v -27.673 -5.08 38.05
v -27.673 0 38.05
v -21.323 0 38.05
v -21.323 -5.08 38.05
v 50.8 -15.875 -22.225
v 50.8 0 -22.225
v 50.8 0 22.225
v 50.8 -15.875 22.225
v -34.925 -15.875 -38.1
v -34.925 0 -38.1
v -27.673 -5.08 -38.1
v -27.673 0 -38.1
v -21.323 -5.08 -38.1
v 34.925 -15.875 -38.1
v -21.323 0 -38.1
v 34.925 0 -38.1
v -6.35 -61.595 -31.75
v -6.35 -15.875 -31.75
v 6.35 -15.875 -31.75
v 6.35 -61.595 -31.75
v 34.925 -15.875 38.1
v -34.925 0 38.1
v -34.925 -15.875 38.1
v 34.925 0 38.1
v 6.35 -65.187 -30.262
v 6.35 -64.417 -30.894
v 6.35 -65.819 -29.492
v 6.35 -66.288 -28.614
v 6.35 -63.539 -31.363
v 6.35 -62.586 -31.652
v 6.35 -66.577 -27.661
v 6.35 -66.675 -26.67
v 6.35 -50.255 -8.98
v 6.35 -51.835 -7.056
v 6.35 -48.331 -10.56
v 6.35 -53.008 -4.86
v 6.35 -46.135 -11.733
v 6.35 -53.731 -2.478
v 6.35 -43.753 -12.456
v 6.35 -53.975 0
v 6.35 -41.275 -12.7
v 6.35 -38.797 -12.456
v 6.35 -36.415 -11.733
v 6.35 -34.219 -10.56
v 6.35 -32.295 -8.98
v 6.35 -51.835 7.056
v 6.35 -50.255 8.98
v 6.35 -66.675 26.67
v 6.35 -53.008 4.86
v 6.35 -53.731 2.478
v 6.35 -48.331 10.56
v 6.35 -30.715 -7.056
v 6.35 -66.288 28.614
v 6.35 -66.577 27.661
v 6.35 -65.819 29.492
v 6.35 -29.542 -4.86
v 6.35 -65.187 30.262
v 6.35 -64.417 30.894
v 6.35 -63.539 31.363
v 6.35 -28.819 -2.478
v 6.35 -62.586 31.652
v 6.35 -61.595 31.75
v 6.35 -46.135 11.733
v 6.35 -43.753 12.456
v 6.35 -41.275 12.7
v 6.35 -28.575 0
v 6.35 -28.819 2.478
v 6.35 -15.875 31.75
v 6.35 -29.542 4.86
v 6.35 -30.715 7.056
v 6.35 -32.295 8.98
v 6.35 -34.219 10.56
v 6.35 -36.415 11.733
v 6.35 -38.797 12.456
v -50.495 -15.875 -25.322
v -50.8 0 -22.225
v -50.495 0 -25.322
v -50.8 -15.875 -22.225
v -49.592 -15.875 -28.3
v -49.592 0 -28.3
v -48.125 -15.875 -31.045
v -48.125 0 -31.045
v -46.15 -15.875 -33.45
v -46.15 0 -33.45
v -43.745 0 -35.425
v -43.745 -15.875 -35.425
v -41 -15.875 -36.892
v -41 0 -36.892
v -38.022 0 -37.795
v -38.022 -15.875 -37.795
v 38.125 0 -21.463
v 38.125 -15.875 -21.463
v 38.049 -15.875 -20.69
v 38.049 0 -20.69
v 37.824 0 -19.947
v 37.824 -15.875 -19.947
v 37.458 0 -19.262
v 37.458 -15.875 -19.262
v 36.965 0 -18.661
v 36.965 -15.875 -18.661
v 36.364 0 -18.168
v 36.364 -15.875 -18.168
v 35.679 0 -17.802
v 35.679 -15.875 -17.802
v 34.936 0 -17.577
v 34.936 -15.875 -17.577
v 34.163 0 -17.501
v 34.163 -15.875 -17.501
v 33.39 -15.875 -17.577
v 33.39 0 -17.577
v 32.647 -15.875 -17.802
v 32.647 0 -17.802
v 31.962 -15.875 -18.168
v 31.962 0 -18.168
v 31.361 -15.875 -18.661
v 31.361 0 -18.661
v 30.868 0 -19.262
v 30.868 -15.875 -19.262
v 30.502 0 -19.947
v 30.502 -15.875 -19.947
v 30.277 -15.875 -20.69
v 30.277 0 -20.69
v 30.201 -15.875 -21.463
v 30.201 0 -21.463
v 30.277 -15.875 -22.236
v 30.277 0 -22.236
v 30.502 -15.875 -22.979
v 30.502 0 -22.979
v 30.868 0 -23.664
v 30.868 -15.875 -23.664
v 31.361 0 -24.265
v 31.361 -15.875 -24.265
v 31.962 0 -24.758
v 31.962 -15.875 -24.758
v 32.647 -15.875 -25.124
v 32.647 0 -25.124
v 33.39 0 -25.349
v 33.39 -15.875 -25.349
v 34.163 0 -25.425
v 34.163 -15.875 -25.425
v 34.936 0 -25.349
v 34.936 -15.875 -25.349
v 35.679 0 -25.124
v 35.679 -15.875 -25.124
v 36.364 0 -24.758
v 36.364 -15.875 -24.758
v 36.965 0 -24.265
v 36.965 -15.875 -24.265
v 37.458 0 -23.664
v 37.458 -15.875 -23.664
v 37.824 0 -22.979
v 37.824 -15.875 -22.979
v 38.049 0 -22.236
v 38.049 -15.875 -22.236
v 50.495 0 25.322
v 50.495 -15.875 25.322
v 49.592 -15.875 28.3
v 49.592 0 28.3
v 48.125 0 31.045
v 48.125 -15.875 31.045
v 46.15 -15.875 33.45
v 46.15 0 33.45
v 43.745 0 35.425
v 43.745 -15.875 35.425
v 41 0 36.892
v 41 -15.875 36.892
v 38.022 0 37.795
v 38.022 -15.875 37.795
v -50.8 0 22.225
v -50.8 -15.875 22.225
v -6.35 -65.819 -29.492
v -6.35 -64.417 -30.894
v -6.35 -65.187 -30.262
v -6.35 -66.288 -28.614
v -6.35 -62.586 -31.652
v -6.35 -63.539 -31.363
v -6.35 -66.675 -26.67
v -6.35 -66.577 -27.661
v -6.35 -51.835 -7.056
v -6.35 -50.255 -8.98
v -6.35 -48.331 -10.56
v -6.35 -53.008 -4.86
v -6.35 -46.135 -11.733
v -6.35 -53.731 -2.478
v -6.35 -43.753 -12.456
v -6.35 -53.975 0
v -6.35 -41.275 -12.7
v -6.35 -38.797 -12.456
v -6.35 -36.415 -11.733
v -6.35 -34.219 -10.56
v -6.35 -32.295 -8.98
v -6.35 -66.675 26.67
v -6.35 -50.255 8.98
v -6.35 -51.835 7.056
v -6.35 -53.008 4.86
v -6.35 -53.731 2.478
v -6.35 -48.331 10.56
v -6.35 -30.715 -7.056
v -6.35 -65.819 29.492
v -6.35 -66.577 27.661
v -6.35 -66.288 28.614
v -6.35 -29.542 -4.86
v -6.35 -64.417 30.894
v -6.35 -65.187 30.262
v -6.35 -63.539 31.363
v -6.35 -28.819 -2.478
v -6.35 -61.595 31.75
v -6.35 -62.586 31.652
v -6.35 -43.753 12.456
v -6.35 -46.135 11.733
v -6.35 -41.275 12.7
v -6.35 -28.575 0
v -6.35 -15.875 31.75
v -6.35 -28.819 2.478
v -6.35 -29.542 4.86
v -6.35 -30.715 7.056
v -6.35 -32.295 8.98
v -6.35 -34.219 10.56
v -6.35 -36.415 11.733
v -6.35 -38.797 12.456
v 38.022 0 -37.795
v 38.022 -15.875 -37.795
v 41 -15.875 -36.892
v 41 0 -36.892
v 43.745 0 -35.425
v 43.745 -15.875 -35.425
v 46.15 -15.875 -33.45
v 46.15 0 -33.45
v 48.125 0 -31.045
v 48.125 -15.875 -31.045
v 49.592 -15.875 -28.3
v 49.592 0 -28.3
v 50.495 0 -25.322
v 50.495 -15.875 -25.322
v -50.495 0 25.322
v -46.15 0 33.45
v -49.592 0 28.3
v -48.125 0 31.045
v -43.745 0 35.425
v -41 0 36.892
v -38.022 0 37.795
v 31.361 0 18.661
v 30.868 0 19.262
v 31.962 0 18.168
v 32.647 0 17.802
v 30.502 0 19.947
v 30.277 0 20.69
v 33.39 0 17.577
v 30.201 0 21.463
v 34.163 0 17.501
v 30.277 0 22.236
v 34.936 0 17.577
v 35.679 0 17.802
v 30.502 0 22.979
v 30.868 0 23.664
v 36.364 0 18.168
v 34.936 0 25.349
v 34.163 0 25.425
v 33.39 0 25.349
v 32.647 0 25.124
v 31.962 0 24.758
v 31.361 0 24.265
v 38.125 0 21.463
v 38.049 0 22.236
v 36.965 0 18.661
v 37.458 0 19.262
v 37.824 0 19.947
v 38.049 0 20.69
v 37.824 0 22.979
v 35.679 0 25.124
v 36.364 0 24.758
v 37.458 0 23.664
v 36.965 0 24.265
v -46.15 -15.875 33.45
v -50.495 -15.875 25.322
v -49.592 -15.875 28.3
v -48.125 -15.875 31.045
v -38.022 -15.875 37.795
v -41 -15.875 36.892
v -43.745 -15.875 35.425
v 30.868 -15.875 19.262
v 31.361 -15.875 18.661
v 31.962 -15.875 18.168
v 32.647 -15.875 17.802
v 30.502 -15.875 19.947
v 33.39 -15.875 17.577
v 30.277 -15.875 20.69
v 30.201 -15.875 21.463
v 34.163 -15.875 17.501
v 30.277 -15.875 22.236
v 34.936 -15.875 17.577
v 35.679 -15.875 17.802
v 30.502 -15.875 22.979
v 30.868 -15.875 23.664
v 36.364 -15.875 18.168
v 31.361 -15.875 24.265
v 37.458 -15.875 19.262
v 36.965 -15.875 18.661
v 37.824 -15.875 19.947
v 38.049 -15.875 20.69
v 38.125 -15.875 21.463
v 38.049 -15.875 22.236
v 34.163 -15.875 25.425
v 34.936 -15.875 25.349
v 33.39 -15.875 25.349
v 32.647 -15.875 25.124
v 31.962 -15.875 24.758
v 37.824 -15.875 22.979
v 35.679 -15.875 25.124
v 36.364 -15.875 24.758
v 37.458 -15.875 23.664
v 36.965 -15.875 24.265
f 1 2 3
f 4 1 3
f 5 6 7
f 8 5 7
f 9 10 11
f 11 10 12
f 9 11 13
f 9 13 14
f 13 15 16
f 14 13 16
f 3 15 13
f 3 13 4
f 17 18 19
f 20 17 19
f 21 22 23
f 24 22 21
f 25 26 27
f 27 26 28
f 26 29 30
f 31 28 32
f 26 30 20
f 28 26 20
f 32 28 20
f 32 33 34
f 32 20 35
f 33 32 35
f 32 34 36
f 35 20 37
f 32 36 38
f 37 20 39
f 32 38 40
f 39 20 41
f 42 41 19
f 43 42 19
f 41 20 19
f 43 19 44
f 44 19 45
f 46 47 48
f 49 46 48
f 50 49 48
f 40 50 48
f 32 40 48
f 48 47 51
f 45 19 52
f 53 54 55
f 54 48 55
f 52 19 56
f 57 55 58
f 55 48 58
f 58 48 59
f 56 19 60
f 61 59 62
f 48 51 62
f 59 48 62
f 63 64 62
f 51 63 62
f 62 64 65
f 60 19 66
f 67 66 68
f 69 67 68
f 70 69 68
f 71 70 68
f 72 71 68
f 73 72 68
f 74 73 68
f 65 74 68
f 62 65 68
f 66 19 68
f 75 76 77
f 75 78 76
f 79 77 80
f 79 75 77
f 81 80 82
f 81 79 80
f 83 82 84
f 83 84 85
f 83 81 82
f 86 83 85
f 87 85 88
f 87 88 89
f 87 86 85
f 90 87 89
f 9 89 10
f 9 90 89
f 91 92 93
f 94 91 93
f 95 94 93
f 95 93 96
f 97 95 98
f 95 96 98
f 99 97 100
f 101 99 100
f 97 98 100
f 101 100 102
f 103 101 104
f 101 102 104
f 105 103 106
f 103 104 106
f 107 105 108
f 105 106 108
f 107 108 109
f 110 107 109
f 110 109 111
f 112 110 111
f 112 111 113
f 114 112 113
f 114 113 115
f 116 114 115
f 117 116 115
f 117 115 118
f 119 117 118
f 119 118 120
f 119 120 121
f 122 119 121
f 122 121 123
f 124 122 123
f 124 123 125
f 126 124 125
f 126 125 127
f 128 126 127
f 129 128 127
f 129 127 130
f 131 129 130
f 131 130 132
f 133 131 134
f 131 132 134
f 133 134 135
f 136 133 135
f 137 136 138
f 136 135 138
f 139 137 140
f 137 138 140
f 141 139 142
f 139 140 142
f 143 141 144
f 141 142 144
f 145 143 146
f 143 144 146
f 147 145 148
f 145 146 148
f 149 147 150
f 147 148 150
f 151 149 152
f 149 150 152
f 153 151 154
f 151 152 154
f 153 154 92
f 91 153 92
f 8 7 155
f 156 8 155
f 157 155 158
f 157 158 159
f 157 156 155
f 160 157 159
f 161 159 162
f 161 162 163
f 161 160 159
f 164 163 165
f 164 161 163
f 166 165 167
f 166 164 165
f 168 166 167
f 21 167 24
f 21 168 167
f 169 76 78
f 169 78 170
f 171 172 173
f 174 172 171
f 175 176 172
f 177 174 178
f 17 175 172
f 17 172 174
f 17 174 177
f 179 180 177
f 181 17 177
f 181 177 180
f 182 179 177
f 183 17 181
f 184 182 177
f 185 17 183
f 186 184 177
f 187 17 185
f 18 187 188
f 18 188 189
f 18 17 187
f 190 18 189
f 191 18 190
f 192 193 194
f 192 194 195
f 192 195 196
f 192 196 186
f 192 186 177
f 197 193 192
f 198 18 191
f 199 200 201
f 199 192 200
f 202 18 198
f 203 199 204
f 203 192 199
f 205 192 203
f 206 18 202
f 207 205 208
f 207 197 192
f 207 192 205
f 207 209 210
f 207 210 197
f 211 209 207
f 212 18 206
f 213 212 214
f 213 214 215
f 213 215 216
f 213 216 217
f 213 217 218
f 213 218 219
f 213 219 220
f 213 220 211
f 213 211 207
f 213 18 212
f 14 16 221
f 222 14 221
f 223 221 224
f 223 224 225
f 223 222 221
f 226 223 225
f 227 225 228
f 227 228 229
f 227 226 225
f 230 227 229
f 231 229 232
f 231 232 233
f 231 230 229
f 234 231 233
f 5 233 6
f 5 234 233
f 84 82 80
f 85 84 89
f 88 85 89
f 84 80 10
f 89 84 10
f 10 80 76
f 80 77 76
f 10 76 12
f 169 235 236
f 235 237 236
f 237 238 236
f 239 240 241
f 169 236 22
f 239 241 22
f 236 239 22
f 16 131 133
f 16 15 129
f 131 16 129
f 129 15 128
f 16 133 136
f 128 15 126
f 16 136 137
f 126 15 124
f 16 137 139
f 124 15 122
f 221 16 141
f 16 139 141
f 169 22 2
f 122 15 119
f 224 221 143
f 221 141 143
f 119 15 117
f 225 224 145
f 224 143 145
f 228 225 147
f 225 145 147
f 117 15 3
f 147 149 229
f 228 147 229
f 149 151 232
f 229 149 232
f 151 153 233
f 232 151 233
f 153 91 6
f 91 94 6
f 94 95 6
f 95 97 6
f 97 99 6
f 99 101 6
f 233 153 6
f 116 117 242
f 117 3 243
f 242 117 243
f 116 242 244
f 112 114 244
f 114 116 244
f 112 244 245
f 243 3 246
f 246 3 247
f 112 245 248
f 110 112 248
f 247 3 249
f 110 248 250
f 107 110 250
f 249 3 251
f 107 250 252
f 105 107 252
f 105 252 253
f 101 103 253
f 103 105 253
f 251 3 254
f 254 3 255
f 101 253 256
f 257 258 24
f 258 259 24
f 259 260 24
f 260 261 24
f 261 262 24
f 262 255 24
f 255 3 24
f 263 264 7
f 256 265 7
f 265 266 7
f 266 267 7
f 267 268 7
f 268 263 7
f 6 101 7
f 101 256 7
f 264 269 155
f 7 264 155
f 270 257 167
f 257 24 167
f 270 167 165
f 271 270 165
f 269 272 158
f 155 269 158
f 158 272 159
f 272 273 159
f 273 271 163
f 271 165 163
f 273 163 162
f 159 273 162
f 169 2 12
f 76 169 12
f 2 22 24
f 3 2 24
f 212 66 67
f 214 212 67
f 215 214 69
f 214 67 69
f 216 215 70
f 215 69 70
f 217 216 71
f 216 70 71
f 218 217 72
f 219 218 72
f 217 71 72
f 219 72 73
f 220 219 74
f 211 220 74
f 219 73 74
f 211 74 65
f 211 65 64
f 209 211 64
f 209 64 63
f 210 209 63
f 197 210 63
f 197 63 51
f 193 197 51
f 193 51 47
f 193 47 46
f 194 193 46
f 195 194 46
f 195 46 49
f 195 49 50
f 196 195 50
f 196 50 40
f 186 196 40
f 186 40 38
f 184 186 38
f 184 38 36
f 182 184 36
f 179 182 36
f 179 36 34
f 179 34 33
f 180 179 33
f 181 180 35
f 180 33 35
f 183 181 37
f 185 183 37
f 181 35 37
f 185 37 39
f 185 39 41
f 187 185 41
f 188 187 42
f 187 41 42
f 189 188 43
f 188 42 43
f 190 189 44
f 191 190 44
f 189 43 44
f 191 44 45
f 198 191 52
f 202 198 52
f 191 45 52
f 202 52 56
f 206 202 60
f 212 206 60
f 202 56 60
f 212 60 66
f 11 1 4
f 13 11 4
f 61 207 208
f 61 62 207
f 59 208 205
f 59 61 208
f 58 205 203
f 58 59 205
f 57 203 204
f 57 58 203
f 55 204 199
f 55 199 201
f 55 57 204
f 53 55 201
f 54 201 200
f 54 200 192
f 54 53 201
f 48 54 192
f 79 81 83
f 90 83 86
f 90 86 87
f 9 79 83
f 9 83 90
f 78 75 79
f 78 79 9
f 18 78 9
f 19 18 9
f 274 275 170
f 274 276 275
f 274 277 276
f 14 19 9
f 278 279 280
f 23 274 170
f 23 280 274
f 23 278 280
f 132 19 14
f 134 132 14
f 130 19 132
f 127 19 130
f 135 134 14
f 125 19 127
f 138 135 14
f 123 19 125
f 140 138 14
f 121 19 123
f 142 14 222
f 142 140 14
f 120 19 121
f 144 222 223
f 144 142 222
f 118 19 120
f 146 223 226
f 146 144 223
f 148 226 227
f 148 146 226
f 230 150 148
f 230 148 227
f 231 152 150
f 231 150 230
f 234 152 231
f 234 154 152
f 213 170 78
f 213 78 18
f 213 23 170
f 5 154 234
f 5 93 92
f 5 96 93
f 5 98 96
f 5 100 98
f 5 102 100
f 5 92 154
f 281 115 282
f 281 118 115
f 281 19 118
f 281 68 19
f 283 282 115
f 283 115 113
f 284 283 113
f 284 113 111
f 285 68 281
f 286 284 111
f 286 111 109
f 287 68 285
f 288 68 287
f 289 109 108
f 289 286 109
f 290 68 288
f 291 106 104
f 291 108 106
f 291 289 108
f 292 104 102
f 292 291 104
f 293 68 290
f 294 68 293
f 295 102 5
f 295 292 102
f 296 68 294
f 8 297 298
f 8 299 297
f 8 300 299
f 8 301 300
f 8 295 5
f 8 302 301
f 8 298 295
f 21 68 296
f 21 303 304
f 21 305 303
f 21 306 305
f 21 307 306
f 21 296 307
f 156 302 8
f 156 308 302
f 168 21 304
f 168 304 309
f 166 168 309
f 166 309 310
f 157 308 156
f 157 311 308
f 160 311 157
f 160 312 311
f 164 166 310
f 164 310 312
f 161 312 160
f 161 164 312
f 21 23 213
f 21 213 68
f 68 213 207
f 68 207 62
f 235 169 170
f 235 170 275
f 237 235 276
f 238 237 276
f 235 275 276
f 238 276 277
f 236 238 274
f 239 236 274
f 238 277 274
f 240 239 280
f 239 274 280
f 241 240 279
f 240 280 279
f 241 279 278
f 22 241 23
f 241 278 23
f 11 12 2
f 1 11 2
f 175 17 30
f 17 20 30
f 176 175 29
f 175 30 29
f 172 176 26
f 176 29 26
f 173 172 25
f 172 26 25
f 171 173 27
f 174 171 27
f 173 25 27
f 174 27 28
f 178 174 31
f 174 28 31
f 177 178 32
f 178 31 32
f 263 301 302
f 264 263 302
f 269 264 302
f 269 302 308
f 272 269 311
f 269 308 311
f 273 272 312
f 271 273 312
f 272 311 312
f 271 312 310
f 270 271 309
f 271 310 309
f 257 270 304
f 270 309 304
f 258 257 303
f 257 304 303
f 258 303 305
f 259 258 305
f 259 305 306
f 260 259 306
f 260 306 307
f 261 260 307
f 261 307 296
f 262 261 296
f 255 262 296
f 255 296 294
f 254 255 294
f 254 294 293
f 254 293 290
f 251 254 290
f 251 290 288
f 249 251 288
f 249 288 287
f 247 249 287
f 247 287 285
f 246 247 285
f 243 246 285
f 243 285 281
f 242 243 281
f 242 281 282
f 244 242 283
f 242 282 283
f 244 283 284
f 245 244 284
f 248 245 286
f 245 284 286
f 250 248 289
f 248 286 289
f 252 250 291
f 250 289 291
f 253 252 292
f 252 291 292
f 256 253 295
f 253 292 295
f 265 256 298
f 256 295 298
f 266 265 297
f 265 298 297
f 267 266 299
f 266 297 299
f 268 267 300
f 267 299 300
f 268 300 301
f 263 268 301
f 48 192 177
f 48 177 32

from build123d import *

# Parameters (mm, degrees)
F0_W      = 101.6
F0_H      = 76.2
F1_DEPTH  = 15.875
F2_R      = 15.875
F3_R      = 3.9624
F4_DEPTH  = 25.4
F5_W      = 12.7
F5_H      = 63.5
F6_DEPTH  = 50.8
F7_R      = 5.08
F8_R      = 12.7
F9_DEPTH  = 25.4
F10_W     = 6.35
F10_H     = 76.149869
F11_DEPTH = 5.08


with BuildPart() as f1:
    # F0 (on Front) → F1 (new body)
    with BuildSketch(Plane.XZ):
        Rectangle(F0_W, F0_H)
    extrude(amount=F1_DEPTH)

    # F2
    f2_edges = [f1.edges().sort_by_distance(p)[0] for p in [
        (-50.8, -7.9375, 38.1),
        (50.8, -7.9375, 38.1),
        (50.8, -7.9375, -38.1),
        (-50.8, -7.9375, -38.1),
    ]]
    fillet(f2_edges, radius=F2_R)

    # F3 (on face) → F4 (cut)
    with BuildSketch(Plane.XZ.offset(15.875)):
        with Locations((34.163, -21.463)):
            Circle(F3_R)
        with Locations((34.163, 21.463)):
            Circle(F3_R)
    extrude(amount=-F4_DEPTH, mode=Mode.SUBTRACT)

    # F5 (on face) → F6 (join)
    with BuildSketch(Plane.XZ.offset(15.875)):
        Rectangle(F5_W, F5_H)
    extrude(amount=F6_DEPTH)

    # F7
    f7_edges = [f1.edges().sort_by_distance(p)[0] for p in [
        (0, -66.675, -31.75),
        (0, -66.675, 31.75),
    ]]
    fillet(f7_edges, radius=F7_R)

    # F8 (on face) → F9 (cut)
    with BuildSketch(Plane.YZ.offset(6.35)):
        with Locations((-41.275, 0)):
            Circle(F8_R)
    extrude(amount=-F9_DEPTH, mode=Mode.SUBTRACT)

    # F10 (on face) → F11 (cut)
    with BuildSketch(Plane.XZ):
        with Locations((-24.497632, -0.025066)):
            Rectangle(F10_W, F10_H)
    extrude(amount=F11_DEPTH, mode=Mode.SUBTRACT)


solid = f1.part
